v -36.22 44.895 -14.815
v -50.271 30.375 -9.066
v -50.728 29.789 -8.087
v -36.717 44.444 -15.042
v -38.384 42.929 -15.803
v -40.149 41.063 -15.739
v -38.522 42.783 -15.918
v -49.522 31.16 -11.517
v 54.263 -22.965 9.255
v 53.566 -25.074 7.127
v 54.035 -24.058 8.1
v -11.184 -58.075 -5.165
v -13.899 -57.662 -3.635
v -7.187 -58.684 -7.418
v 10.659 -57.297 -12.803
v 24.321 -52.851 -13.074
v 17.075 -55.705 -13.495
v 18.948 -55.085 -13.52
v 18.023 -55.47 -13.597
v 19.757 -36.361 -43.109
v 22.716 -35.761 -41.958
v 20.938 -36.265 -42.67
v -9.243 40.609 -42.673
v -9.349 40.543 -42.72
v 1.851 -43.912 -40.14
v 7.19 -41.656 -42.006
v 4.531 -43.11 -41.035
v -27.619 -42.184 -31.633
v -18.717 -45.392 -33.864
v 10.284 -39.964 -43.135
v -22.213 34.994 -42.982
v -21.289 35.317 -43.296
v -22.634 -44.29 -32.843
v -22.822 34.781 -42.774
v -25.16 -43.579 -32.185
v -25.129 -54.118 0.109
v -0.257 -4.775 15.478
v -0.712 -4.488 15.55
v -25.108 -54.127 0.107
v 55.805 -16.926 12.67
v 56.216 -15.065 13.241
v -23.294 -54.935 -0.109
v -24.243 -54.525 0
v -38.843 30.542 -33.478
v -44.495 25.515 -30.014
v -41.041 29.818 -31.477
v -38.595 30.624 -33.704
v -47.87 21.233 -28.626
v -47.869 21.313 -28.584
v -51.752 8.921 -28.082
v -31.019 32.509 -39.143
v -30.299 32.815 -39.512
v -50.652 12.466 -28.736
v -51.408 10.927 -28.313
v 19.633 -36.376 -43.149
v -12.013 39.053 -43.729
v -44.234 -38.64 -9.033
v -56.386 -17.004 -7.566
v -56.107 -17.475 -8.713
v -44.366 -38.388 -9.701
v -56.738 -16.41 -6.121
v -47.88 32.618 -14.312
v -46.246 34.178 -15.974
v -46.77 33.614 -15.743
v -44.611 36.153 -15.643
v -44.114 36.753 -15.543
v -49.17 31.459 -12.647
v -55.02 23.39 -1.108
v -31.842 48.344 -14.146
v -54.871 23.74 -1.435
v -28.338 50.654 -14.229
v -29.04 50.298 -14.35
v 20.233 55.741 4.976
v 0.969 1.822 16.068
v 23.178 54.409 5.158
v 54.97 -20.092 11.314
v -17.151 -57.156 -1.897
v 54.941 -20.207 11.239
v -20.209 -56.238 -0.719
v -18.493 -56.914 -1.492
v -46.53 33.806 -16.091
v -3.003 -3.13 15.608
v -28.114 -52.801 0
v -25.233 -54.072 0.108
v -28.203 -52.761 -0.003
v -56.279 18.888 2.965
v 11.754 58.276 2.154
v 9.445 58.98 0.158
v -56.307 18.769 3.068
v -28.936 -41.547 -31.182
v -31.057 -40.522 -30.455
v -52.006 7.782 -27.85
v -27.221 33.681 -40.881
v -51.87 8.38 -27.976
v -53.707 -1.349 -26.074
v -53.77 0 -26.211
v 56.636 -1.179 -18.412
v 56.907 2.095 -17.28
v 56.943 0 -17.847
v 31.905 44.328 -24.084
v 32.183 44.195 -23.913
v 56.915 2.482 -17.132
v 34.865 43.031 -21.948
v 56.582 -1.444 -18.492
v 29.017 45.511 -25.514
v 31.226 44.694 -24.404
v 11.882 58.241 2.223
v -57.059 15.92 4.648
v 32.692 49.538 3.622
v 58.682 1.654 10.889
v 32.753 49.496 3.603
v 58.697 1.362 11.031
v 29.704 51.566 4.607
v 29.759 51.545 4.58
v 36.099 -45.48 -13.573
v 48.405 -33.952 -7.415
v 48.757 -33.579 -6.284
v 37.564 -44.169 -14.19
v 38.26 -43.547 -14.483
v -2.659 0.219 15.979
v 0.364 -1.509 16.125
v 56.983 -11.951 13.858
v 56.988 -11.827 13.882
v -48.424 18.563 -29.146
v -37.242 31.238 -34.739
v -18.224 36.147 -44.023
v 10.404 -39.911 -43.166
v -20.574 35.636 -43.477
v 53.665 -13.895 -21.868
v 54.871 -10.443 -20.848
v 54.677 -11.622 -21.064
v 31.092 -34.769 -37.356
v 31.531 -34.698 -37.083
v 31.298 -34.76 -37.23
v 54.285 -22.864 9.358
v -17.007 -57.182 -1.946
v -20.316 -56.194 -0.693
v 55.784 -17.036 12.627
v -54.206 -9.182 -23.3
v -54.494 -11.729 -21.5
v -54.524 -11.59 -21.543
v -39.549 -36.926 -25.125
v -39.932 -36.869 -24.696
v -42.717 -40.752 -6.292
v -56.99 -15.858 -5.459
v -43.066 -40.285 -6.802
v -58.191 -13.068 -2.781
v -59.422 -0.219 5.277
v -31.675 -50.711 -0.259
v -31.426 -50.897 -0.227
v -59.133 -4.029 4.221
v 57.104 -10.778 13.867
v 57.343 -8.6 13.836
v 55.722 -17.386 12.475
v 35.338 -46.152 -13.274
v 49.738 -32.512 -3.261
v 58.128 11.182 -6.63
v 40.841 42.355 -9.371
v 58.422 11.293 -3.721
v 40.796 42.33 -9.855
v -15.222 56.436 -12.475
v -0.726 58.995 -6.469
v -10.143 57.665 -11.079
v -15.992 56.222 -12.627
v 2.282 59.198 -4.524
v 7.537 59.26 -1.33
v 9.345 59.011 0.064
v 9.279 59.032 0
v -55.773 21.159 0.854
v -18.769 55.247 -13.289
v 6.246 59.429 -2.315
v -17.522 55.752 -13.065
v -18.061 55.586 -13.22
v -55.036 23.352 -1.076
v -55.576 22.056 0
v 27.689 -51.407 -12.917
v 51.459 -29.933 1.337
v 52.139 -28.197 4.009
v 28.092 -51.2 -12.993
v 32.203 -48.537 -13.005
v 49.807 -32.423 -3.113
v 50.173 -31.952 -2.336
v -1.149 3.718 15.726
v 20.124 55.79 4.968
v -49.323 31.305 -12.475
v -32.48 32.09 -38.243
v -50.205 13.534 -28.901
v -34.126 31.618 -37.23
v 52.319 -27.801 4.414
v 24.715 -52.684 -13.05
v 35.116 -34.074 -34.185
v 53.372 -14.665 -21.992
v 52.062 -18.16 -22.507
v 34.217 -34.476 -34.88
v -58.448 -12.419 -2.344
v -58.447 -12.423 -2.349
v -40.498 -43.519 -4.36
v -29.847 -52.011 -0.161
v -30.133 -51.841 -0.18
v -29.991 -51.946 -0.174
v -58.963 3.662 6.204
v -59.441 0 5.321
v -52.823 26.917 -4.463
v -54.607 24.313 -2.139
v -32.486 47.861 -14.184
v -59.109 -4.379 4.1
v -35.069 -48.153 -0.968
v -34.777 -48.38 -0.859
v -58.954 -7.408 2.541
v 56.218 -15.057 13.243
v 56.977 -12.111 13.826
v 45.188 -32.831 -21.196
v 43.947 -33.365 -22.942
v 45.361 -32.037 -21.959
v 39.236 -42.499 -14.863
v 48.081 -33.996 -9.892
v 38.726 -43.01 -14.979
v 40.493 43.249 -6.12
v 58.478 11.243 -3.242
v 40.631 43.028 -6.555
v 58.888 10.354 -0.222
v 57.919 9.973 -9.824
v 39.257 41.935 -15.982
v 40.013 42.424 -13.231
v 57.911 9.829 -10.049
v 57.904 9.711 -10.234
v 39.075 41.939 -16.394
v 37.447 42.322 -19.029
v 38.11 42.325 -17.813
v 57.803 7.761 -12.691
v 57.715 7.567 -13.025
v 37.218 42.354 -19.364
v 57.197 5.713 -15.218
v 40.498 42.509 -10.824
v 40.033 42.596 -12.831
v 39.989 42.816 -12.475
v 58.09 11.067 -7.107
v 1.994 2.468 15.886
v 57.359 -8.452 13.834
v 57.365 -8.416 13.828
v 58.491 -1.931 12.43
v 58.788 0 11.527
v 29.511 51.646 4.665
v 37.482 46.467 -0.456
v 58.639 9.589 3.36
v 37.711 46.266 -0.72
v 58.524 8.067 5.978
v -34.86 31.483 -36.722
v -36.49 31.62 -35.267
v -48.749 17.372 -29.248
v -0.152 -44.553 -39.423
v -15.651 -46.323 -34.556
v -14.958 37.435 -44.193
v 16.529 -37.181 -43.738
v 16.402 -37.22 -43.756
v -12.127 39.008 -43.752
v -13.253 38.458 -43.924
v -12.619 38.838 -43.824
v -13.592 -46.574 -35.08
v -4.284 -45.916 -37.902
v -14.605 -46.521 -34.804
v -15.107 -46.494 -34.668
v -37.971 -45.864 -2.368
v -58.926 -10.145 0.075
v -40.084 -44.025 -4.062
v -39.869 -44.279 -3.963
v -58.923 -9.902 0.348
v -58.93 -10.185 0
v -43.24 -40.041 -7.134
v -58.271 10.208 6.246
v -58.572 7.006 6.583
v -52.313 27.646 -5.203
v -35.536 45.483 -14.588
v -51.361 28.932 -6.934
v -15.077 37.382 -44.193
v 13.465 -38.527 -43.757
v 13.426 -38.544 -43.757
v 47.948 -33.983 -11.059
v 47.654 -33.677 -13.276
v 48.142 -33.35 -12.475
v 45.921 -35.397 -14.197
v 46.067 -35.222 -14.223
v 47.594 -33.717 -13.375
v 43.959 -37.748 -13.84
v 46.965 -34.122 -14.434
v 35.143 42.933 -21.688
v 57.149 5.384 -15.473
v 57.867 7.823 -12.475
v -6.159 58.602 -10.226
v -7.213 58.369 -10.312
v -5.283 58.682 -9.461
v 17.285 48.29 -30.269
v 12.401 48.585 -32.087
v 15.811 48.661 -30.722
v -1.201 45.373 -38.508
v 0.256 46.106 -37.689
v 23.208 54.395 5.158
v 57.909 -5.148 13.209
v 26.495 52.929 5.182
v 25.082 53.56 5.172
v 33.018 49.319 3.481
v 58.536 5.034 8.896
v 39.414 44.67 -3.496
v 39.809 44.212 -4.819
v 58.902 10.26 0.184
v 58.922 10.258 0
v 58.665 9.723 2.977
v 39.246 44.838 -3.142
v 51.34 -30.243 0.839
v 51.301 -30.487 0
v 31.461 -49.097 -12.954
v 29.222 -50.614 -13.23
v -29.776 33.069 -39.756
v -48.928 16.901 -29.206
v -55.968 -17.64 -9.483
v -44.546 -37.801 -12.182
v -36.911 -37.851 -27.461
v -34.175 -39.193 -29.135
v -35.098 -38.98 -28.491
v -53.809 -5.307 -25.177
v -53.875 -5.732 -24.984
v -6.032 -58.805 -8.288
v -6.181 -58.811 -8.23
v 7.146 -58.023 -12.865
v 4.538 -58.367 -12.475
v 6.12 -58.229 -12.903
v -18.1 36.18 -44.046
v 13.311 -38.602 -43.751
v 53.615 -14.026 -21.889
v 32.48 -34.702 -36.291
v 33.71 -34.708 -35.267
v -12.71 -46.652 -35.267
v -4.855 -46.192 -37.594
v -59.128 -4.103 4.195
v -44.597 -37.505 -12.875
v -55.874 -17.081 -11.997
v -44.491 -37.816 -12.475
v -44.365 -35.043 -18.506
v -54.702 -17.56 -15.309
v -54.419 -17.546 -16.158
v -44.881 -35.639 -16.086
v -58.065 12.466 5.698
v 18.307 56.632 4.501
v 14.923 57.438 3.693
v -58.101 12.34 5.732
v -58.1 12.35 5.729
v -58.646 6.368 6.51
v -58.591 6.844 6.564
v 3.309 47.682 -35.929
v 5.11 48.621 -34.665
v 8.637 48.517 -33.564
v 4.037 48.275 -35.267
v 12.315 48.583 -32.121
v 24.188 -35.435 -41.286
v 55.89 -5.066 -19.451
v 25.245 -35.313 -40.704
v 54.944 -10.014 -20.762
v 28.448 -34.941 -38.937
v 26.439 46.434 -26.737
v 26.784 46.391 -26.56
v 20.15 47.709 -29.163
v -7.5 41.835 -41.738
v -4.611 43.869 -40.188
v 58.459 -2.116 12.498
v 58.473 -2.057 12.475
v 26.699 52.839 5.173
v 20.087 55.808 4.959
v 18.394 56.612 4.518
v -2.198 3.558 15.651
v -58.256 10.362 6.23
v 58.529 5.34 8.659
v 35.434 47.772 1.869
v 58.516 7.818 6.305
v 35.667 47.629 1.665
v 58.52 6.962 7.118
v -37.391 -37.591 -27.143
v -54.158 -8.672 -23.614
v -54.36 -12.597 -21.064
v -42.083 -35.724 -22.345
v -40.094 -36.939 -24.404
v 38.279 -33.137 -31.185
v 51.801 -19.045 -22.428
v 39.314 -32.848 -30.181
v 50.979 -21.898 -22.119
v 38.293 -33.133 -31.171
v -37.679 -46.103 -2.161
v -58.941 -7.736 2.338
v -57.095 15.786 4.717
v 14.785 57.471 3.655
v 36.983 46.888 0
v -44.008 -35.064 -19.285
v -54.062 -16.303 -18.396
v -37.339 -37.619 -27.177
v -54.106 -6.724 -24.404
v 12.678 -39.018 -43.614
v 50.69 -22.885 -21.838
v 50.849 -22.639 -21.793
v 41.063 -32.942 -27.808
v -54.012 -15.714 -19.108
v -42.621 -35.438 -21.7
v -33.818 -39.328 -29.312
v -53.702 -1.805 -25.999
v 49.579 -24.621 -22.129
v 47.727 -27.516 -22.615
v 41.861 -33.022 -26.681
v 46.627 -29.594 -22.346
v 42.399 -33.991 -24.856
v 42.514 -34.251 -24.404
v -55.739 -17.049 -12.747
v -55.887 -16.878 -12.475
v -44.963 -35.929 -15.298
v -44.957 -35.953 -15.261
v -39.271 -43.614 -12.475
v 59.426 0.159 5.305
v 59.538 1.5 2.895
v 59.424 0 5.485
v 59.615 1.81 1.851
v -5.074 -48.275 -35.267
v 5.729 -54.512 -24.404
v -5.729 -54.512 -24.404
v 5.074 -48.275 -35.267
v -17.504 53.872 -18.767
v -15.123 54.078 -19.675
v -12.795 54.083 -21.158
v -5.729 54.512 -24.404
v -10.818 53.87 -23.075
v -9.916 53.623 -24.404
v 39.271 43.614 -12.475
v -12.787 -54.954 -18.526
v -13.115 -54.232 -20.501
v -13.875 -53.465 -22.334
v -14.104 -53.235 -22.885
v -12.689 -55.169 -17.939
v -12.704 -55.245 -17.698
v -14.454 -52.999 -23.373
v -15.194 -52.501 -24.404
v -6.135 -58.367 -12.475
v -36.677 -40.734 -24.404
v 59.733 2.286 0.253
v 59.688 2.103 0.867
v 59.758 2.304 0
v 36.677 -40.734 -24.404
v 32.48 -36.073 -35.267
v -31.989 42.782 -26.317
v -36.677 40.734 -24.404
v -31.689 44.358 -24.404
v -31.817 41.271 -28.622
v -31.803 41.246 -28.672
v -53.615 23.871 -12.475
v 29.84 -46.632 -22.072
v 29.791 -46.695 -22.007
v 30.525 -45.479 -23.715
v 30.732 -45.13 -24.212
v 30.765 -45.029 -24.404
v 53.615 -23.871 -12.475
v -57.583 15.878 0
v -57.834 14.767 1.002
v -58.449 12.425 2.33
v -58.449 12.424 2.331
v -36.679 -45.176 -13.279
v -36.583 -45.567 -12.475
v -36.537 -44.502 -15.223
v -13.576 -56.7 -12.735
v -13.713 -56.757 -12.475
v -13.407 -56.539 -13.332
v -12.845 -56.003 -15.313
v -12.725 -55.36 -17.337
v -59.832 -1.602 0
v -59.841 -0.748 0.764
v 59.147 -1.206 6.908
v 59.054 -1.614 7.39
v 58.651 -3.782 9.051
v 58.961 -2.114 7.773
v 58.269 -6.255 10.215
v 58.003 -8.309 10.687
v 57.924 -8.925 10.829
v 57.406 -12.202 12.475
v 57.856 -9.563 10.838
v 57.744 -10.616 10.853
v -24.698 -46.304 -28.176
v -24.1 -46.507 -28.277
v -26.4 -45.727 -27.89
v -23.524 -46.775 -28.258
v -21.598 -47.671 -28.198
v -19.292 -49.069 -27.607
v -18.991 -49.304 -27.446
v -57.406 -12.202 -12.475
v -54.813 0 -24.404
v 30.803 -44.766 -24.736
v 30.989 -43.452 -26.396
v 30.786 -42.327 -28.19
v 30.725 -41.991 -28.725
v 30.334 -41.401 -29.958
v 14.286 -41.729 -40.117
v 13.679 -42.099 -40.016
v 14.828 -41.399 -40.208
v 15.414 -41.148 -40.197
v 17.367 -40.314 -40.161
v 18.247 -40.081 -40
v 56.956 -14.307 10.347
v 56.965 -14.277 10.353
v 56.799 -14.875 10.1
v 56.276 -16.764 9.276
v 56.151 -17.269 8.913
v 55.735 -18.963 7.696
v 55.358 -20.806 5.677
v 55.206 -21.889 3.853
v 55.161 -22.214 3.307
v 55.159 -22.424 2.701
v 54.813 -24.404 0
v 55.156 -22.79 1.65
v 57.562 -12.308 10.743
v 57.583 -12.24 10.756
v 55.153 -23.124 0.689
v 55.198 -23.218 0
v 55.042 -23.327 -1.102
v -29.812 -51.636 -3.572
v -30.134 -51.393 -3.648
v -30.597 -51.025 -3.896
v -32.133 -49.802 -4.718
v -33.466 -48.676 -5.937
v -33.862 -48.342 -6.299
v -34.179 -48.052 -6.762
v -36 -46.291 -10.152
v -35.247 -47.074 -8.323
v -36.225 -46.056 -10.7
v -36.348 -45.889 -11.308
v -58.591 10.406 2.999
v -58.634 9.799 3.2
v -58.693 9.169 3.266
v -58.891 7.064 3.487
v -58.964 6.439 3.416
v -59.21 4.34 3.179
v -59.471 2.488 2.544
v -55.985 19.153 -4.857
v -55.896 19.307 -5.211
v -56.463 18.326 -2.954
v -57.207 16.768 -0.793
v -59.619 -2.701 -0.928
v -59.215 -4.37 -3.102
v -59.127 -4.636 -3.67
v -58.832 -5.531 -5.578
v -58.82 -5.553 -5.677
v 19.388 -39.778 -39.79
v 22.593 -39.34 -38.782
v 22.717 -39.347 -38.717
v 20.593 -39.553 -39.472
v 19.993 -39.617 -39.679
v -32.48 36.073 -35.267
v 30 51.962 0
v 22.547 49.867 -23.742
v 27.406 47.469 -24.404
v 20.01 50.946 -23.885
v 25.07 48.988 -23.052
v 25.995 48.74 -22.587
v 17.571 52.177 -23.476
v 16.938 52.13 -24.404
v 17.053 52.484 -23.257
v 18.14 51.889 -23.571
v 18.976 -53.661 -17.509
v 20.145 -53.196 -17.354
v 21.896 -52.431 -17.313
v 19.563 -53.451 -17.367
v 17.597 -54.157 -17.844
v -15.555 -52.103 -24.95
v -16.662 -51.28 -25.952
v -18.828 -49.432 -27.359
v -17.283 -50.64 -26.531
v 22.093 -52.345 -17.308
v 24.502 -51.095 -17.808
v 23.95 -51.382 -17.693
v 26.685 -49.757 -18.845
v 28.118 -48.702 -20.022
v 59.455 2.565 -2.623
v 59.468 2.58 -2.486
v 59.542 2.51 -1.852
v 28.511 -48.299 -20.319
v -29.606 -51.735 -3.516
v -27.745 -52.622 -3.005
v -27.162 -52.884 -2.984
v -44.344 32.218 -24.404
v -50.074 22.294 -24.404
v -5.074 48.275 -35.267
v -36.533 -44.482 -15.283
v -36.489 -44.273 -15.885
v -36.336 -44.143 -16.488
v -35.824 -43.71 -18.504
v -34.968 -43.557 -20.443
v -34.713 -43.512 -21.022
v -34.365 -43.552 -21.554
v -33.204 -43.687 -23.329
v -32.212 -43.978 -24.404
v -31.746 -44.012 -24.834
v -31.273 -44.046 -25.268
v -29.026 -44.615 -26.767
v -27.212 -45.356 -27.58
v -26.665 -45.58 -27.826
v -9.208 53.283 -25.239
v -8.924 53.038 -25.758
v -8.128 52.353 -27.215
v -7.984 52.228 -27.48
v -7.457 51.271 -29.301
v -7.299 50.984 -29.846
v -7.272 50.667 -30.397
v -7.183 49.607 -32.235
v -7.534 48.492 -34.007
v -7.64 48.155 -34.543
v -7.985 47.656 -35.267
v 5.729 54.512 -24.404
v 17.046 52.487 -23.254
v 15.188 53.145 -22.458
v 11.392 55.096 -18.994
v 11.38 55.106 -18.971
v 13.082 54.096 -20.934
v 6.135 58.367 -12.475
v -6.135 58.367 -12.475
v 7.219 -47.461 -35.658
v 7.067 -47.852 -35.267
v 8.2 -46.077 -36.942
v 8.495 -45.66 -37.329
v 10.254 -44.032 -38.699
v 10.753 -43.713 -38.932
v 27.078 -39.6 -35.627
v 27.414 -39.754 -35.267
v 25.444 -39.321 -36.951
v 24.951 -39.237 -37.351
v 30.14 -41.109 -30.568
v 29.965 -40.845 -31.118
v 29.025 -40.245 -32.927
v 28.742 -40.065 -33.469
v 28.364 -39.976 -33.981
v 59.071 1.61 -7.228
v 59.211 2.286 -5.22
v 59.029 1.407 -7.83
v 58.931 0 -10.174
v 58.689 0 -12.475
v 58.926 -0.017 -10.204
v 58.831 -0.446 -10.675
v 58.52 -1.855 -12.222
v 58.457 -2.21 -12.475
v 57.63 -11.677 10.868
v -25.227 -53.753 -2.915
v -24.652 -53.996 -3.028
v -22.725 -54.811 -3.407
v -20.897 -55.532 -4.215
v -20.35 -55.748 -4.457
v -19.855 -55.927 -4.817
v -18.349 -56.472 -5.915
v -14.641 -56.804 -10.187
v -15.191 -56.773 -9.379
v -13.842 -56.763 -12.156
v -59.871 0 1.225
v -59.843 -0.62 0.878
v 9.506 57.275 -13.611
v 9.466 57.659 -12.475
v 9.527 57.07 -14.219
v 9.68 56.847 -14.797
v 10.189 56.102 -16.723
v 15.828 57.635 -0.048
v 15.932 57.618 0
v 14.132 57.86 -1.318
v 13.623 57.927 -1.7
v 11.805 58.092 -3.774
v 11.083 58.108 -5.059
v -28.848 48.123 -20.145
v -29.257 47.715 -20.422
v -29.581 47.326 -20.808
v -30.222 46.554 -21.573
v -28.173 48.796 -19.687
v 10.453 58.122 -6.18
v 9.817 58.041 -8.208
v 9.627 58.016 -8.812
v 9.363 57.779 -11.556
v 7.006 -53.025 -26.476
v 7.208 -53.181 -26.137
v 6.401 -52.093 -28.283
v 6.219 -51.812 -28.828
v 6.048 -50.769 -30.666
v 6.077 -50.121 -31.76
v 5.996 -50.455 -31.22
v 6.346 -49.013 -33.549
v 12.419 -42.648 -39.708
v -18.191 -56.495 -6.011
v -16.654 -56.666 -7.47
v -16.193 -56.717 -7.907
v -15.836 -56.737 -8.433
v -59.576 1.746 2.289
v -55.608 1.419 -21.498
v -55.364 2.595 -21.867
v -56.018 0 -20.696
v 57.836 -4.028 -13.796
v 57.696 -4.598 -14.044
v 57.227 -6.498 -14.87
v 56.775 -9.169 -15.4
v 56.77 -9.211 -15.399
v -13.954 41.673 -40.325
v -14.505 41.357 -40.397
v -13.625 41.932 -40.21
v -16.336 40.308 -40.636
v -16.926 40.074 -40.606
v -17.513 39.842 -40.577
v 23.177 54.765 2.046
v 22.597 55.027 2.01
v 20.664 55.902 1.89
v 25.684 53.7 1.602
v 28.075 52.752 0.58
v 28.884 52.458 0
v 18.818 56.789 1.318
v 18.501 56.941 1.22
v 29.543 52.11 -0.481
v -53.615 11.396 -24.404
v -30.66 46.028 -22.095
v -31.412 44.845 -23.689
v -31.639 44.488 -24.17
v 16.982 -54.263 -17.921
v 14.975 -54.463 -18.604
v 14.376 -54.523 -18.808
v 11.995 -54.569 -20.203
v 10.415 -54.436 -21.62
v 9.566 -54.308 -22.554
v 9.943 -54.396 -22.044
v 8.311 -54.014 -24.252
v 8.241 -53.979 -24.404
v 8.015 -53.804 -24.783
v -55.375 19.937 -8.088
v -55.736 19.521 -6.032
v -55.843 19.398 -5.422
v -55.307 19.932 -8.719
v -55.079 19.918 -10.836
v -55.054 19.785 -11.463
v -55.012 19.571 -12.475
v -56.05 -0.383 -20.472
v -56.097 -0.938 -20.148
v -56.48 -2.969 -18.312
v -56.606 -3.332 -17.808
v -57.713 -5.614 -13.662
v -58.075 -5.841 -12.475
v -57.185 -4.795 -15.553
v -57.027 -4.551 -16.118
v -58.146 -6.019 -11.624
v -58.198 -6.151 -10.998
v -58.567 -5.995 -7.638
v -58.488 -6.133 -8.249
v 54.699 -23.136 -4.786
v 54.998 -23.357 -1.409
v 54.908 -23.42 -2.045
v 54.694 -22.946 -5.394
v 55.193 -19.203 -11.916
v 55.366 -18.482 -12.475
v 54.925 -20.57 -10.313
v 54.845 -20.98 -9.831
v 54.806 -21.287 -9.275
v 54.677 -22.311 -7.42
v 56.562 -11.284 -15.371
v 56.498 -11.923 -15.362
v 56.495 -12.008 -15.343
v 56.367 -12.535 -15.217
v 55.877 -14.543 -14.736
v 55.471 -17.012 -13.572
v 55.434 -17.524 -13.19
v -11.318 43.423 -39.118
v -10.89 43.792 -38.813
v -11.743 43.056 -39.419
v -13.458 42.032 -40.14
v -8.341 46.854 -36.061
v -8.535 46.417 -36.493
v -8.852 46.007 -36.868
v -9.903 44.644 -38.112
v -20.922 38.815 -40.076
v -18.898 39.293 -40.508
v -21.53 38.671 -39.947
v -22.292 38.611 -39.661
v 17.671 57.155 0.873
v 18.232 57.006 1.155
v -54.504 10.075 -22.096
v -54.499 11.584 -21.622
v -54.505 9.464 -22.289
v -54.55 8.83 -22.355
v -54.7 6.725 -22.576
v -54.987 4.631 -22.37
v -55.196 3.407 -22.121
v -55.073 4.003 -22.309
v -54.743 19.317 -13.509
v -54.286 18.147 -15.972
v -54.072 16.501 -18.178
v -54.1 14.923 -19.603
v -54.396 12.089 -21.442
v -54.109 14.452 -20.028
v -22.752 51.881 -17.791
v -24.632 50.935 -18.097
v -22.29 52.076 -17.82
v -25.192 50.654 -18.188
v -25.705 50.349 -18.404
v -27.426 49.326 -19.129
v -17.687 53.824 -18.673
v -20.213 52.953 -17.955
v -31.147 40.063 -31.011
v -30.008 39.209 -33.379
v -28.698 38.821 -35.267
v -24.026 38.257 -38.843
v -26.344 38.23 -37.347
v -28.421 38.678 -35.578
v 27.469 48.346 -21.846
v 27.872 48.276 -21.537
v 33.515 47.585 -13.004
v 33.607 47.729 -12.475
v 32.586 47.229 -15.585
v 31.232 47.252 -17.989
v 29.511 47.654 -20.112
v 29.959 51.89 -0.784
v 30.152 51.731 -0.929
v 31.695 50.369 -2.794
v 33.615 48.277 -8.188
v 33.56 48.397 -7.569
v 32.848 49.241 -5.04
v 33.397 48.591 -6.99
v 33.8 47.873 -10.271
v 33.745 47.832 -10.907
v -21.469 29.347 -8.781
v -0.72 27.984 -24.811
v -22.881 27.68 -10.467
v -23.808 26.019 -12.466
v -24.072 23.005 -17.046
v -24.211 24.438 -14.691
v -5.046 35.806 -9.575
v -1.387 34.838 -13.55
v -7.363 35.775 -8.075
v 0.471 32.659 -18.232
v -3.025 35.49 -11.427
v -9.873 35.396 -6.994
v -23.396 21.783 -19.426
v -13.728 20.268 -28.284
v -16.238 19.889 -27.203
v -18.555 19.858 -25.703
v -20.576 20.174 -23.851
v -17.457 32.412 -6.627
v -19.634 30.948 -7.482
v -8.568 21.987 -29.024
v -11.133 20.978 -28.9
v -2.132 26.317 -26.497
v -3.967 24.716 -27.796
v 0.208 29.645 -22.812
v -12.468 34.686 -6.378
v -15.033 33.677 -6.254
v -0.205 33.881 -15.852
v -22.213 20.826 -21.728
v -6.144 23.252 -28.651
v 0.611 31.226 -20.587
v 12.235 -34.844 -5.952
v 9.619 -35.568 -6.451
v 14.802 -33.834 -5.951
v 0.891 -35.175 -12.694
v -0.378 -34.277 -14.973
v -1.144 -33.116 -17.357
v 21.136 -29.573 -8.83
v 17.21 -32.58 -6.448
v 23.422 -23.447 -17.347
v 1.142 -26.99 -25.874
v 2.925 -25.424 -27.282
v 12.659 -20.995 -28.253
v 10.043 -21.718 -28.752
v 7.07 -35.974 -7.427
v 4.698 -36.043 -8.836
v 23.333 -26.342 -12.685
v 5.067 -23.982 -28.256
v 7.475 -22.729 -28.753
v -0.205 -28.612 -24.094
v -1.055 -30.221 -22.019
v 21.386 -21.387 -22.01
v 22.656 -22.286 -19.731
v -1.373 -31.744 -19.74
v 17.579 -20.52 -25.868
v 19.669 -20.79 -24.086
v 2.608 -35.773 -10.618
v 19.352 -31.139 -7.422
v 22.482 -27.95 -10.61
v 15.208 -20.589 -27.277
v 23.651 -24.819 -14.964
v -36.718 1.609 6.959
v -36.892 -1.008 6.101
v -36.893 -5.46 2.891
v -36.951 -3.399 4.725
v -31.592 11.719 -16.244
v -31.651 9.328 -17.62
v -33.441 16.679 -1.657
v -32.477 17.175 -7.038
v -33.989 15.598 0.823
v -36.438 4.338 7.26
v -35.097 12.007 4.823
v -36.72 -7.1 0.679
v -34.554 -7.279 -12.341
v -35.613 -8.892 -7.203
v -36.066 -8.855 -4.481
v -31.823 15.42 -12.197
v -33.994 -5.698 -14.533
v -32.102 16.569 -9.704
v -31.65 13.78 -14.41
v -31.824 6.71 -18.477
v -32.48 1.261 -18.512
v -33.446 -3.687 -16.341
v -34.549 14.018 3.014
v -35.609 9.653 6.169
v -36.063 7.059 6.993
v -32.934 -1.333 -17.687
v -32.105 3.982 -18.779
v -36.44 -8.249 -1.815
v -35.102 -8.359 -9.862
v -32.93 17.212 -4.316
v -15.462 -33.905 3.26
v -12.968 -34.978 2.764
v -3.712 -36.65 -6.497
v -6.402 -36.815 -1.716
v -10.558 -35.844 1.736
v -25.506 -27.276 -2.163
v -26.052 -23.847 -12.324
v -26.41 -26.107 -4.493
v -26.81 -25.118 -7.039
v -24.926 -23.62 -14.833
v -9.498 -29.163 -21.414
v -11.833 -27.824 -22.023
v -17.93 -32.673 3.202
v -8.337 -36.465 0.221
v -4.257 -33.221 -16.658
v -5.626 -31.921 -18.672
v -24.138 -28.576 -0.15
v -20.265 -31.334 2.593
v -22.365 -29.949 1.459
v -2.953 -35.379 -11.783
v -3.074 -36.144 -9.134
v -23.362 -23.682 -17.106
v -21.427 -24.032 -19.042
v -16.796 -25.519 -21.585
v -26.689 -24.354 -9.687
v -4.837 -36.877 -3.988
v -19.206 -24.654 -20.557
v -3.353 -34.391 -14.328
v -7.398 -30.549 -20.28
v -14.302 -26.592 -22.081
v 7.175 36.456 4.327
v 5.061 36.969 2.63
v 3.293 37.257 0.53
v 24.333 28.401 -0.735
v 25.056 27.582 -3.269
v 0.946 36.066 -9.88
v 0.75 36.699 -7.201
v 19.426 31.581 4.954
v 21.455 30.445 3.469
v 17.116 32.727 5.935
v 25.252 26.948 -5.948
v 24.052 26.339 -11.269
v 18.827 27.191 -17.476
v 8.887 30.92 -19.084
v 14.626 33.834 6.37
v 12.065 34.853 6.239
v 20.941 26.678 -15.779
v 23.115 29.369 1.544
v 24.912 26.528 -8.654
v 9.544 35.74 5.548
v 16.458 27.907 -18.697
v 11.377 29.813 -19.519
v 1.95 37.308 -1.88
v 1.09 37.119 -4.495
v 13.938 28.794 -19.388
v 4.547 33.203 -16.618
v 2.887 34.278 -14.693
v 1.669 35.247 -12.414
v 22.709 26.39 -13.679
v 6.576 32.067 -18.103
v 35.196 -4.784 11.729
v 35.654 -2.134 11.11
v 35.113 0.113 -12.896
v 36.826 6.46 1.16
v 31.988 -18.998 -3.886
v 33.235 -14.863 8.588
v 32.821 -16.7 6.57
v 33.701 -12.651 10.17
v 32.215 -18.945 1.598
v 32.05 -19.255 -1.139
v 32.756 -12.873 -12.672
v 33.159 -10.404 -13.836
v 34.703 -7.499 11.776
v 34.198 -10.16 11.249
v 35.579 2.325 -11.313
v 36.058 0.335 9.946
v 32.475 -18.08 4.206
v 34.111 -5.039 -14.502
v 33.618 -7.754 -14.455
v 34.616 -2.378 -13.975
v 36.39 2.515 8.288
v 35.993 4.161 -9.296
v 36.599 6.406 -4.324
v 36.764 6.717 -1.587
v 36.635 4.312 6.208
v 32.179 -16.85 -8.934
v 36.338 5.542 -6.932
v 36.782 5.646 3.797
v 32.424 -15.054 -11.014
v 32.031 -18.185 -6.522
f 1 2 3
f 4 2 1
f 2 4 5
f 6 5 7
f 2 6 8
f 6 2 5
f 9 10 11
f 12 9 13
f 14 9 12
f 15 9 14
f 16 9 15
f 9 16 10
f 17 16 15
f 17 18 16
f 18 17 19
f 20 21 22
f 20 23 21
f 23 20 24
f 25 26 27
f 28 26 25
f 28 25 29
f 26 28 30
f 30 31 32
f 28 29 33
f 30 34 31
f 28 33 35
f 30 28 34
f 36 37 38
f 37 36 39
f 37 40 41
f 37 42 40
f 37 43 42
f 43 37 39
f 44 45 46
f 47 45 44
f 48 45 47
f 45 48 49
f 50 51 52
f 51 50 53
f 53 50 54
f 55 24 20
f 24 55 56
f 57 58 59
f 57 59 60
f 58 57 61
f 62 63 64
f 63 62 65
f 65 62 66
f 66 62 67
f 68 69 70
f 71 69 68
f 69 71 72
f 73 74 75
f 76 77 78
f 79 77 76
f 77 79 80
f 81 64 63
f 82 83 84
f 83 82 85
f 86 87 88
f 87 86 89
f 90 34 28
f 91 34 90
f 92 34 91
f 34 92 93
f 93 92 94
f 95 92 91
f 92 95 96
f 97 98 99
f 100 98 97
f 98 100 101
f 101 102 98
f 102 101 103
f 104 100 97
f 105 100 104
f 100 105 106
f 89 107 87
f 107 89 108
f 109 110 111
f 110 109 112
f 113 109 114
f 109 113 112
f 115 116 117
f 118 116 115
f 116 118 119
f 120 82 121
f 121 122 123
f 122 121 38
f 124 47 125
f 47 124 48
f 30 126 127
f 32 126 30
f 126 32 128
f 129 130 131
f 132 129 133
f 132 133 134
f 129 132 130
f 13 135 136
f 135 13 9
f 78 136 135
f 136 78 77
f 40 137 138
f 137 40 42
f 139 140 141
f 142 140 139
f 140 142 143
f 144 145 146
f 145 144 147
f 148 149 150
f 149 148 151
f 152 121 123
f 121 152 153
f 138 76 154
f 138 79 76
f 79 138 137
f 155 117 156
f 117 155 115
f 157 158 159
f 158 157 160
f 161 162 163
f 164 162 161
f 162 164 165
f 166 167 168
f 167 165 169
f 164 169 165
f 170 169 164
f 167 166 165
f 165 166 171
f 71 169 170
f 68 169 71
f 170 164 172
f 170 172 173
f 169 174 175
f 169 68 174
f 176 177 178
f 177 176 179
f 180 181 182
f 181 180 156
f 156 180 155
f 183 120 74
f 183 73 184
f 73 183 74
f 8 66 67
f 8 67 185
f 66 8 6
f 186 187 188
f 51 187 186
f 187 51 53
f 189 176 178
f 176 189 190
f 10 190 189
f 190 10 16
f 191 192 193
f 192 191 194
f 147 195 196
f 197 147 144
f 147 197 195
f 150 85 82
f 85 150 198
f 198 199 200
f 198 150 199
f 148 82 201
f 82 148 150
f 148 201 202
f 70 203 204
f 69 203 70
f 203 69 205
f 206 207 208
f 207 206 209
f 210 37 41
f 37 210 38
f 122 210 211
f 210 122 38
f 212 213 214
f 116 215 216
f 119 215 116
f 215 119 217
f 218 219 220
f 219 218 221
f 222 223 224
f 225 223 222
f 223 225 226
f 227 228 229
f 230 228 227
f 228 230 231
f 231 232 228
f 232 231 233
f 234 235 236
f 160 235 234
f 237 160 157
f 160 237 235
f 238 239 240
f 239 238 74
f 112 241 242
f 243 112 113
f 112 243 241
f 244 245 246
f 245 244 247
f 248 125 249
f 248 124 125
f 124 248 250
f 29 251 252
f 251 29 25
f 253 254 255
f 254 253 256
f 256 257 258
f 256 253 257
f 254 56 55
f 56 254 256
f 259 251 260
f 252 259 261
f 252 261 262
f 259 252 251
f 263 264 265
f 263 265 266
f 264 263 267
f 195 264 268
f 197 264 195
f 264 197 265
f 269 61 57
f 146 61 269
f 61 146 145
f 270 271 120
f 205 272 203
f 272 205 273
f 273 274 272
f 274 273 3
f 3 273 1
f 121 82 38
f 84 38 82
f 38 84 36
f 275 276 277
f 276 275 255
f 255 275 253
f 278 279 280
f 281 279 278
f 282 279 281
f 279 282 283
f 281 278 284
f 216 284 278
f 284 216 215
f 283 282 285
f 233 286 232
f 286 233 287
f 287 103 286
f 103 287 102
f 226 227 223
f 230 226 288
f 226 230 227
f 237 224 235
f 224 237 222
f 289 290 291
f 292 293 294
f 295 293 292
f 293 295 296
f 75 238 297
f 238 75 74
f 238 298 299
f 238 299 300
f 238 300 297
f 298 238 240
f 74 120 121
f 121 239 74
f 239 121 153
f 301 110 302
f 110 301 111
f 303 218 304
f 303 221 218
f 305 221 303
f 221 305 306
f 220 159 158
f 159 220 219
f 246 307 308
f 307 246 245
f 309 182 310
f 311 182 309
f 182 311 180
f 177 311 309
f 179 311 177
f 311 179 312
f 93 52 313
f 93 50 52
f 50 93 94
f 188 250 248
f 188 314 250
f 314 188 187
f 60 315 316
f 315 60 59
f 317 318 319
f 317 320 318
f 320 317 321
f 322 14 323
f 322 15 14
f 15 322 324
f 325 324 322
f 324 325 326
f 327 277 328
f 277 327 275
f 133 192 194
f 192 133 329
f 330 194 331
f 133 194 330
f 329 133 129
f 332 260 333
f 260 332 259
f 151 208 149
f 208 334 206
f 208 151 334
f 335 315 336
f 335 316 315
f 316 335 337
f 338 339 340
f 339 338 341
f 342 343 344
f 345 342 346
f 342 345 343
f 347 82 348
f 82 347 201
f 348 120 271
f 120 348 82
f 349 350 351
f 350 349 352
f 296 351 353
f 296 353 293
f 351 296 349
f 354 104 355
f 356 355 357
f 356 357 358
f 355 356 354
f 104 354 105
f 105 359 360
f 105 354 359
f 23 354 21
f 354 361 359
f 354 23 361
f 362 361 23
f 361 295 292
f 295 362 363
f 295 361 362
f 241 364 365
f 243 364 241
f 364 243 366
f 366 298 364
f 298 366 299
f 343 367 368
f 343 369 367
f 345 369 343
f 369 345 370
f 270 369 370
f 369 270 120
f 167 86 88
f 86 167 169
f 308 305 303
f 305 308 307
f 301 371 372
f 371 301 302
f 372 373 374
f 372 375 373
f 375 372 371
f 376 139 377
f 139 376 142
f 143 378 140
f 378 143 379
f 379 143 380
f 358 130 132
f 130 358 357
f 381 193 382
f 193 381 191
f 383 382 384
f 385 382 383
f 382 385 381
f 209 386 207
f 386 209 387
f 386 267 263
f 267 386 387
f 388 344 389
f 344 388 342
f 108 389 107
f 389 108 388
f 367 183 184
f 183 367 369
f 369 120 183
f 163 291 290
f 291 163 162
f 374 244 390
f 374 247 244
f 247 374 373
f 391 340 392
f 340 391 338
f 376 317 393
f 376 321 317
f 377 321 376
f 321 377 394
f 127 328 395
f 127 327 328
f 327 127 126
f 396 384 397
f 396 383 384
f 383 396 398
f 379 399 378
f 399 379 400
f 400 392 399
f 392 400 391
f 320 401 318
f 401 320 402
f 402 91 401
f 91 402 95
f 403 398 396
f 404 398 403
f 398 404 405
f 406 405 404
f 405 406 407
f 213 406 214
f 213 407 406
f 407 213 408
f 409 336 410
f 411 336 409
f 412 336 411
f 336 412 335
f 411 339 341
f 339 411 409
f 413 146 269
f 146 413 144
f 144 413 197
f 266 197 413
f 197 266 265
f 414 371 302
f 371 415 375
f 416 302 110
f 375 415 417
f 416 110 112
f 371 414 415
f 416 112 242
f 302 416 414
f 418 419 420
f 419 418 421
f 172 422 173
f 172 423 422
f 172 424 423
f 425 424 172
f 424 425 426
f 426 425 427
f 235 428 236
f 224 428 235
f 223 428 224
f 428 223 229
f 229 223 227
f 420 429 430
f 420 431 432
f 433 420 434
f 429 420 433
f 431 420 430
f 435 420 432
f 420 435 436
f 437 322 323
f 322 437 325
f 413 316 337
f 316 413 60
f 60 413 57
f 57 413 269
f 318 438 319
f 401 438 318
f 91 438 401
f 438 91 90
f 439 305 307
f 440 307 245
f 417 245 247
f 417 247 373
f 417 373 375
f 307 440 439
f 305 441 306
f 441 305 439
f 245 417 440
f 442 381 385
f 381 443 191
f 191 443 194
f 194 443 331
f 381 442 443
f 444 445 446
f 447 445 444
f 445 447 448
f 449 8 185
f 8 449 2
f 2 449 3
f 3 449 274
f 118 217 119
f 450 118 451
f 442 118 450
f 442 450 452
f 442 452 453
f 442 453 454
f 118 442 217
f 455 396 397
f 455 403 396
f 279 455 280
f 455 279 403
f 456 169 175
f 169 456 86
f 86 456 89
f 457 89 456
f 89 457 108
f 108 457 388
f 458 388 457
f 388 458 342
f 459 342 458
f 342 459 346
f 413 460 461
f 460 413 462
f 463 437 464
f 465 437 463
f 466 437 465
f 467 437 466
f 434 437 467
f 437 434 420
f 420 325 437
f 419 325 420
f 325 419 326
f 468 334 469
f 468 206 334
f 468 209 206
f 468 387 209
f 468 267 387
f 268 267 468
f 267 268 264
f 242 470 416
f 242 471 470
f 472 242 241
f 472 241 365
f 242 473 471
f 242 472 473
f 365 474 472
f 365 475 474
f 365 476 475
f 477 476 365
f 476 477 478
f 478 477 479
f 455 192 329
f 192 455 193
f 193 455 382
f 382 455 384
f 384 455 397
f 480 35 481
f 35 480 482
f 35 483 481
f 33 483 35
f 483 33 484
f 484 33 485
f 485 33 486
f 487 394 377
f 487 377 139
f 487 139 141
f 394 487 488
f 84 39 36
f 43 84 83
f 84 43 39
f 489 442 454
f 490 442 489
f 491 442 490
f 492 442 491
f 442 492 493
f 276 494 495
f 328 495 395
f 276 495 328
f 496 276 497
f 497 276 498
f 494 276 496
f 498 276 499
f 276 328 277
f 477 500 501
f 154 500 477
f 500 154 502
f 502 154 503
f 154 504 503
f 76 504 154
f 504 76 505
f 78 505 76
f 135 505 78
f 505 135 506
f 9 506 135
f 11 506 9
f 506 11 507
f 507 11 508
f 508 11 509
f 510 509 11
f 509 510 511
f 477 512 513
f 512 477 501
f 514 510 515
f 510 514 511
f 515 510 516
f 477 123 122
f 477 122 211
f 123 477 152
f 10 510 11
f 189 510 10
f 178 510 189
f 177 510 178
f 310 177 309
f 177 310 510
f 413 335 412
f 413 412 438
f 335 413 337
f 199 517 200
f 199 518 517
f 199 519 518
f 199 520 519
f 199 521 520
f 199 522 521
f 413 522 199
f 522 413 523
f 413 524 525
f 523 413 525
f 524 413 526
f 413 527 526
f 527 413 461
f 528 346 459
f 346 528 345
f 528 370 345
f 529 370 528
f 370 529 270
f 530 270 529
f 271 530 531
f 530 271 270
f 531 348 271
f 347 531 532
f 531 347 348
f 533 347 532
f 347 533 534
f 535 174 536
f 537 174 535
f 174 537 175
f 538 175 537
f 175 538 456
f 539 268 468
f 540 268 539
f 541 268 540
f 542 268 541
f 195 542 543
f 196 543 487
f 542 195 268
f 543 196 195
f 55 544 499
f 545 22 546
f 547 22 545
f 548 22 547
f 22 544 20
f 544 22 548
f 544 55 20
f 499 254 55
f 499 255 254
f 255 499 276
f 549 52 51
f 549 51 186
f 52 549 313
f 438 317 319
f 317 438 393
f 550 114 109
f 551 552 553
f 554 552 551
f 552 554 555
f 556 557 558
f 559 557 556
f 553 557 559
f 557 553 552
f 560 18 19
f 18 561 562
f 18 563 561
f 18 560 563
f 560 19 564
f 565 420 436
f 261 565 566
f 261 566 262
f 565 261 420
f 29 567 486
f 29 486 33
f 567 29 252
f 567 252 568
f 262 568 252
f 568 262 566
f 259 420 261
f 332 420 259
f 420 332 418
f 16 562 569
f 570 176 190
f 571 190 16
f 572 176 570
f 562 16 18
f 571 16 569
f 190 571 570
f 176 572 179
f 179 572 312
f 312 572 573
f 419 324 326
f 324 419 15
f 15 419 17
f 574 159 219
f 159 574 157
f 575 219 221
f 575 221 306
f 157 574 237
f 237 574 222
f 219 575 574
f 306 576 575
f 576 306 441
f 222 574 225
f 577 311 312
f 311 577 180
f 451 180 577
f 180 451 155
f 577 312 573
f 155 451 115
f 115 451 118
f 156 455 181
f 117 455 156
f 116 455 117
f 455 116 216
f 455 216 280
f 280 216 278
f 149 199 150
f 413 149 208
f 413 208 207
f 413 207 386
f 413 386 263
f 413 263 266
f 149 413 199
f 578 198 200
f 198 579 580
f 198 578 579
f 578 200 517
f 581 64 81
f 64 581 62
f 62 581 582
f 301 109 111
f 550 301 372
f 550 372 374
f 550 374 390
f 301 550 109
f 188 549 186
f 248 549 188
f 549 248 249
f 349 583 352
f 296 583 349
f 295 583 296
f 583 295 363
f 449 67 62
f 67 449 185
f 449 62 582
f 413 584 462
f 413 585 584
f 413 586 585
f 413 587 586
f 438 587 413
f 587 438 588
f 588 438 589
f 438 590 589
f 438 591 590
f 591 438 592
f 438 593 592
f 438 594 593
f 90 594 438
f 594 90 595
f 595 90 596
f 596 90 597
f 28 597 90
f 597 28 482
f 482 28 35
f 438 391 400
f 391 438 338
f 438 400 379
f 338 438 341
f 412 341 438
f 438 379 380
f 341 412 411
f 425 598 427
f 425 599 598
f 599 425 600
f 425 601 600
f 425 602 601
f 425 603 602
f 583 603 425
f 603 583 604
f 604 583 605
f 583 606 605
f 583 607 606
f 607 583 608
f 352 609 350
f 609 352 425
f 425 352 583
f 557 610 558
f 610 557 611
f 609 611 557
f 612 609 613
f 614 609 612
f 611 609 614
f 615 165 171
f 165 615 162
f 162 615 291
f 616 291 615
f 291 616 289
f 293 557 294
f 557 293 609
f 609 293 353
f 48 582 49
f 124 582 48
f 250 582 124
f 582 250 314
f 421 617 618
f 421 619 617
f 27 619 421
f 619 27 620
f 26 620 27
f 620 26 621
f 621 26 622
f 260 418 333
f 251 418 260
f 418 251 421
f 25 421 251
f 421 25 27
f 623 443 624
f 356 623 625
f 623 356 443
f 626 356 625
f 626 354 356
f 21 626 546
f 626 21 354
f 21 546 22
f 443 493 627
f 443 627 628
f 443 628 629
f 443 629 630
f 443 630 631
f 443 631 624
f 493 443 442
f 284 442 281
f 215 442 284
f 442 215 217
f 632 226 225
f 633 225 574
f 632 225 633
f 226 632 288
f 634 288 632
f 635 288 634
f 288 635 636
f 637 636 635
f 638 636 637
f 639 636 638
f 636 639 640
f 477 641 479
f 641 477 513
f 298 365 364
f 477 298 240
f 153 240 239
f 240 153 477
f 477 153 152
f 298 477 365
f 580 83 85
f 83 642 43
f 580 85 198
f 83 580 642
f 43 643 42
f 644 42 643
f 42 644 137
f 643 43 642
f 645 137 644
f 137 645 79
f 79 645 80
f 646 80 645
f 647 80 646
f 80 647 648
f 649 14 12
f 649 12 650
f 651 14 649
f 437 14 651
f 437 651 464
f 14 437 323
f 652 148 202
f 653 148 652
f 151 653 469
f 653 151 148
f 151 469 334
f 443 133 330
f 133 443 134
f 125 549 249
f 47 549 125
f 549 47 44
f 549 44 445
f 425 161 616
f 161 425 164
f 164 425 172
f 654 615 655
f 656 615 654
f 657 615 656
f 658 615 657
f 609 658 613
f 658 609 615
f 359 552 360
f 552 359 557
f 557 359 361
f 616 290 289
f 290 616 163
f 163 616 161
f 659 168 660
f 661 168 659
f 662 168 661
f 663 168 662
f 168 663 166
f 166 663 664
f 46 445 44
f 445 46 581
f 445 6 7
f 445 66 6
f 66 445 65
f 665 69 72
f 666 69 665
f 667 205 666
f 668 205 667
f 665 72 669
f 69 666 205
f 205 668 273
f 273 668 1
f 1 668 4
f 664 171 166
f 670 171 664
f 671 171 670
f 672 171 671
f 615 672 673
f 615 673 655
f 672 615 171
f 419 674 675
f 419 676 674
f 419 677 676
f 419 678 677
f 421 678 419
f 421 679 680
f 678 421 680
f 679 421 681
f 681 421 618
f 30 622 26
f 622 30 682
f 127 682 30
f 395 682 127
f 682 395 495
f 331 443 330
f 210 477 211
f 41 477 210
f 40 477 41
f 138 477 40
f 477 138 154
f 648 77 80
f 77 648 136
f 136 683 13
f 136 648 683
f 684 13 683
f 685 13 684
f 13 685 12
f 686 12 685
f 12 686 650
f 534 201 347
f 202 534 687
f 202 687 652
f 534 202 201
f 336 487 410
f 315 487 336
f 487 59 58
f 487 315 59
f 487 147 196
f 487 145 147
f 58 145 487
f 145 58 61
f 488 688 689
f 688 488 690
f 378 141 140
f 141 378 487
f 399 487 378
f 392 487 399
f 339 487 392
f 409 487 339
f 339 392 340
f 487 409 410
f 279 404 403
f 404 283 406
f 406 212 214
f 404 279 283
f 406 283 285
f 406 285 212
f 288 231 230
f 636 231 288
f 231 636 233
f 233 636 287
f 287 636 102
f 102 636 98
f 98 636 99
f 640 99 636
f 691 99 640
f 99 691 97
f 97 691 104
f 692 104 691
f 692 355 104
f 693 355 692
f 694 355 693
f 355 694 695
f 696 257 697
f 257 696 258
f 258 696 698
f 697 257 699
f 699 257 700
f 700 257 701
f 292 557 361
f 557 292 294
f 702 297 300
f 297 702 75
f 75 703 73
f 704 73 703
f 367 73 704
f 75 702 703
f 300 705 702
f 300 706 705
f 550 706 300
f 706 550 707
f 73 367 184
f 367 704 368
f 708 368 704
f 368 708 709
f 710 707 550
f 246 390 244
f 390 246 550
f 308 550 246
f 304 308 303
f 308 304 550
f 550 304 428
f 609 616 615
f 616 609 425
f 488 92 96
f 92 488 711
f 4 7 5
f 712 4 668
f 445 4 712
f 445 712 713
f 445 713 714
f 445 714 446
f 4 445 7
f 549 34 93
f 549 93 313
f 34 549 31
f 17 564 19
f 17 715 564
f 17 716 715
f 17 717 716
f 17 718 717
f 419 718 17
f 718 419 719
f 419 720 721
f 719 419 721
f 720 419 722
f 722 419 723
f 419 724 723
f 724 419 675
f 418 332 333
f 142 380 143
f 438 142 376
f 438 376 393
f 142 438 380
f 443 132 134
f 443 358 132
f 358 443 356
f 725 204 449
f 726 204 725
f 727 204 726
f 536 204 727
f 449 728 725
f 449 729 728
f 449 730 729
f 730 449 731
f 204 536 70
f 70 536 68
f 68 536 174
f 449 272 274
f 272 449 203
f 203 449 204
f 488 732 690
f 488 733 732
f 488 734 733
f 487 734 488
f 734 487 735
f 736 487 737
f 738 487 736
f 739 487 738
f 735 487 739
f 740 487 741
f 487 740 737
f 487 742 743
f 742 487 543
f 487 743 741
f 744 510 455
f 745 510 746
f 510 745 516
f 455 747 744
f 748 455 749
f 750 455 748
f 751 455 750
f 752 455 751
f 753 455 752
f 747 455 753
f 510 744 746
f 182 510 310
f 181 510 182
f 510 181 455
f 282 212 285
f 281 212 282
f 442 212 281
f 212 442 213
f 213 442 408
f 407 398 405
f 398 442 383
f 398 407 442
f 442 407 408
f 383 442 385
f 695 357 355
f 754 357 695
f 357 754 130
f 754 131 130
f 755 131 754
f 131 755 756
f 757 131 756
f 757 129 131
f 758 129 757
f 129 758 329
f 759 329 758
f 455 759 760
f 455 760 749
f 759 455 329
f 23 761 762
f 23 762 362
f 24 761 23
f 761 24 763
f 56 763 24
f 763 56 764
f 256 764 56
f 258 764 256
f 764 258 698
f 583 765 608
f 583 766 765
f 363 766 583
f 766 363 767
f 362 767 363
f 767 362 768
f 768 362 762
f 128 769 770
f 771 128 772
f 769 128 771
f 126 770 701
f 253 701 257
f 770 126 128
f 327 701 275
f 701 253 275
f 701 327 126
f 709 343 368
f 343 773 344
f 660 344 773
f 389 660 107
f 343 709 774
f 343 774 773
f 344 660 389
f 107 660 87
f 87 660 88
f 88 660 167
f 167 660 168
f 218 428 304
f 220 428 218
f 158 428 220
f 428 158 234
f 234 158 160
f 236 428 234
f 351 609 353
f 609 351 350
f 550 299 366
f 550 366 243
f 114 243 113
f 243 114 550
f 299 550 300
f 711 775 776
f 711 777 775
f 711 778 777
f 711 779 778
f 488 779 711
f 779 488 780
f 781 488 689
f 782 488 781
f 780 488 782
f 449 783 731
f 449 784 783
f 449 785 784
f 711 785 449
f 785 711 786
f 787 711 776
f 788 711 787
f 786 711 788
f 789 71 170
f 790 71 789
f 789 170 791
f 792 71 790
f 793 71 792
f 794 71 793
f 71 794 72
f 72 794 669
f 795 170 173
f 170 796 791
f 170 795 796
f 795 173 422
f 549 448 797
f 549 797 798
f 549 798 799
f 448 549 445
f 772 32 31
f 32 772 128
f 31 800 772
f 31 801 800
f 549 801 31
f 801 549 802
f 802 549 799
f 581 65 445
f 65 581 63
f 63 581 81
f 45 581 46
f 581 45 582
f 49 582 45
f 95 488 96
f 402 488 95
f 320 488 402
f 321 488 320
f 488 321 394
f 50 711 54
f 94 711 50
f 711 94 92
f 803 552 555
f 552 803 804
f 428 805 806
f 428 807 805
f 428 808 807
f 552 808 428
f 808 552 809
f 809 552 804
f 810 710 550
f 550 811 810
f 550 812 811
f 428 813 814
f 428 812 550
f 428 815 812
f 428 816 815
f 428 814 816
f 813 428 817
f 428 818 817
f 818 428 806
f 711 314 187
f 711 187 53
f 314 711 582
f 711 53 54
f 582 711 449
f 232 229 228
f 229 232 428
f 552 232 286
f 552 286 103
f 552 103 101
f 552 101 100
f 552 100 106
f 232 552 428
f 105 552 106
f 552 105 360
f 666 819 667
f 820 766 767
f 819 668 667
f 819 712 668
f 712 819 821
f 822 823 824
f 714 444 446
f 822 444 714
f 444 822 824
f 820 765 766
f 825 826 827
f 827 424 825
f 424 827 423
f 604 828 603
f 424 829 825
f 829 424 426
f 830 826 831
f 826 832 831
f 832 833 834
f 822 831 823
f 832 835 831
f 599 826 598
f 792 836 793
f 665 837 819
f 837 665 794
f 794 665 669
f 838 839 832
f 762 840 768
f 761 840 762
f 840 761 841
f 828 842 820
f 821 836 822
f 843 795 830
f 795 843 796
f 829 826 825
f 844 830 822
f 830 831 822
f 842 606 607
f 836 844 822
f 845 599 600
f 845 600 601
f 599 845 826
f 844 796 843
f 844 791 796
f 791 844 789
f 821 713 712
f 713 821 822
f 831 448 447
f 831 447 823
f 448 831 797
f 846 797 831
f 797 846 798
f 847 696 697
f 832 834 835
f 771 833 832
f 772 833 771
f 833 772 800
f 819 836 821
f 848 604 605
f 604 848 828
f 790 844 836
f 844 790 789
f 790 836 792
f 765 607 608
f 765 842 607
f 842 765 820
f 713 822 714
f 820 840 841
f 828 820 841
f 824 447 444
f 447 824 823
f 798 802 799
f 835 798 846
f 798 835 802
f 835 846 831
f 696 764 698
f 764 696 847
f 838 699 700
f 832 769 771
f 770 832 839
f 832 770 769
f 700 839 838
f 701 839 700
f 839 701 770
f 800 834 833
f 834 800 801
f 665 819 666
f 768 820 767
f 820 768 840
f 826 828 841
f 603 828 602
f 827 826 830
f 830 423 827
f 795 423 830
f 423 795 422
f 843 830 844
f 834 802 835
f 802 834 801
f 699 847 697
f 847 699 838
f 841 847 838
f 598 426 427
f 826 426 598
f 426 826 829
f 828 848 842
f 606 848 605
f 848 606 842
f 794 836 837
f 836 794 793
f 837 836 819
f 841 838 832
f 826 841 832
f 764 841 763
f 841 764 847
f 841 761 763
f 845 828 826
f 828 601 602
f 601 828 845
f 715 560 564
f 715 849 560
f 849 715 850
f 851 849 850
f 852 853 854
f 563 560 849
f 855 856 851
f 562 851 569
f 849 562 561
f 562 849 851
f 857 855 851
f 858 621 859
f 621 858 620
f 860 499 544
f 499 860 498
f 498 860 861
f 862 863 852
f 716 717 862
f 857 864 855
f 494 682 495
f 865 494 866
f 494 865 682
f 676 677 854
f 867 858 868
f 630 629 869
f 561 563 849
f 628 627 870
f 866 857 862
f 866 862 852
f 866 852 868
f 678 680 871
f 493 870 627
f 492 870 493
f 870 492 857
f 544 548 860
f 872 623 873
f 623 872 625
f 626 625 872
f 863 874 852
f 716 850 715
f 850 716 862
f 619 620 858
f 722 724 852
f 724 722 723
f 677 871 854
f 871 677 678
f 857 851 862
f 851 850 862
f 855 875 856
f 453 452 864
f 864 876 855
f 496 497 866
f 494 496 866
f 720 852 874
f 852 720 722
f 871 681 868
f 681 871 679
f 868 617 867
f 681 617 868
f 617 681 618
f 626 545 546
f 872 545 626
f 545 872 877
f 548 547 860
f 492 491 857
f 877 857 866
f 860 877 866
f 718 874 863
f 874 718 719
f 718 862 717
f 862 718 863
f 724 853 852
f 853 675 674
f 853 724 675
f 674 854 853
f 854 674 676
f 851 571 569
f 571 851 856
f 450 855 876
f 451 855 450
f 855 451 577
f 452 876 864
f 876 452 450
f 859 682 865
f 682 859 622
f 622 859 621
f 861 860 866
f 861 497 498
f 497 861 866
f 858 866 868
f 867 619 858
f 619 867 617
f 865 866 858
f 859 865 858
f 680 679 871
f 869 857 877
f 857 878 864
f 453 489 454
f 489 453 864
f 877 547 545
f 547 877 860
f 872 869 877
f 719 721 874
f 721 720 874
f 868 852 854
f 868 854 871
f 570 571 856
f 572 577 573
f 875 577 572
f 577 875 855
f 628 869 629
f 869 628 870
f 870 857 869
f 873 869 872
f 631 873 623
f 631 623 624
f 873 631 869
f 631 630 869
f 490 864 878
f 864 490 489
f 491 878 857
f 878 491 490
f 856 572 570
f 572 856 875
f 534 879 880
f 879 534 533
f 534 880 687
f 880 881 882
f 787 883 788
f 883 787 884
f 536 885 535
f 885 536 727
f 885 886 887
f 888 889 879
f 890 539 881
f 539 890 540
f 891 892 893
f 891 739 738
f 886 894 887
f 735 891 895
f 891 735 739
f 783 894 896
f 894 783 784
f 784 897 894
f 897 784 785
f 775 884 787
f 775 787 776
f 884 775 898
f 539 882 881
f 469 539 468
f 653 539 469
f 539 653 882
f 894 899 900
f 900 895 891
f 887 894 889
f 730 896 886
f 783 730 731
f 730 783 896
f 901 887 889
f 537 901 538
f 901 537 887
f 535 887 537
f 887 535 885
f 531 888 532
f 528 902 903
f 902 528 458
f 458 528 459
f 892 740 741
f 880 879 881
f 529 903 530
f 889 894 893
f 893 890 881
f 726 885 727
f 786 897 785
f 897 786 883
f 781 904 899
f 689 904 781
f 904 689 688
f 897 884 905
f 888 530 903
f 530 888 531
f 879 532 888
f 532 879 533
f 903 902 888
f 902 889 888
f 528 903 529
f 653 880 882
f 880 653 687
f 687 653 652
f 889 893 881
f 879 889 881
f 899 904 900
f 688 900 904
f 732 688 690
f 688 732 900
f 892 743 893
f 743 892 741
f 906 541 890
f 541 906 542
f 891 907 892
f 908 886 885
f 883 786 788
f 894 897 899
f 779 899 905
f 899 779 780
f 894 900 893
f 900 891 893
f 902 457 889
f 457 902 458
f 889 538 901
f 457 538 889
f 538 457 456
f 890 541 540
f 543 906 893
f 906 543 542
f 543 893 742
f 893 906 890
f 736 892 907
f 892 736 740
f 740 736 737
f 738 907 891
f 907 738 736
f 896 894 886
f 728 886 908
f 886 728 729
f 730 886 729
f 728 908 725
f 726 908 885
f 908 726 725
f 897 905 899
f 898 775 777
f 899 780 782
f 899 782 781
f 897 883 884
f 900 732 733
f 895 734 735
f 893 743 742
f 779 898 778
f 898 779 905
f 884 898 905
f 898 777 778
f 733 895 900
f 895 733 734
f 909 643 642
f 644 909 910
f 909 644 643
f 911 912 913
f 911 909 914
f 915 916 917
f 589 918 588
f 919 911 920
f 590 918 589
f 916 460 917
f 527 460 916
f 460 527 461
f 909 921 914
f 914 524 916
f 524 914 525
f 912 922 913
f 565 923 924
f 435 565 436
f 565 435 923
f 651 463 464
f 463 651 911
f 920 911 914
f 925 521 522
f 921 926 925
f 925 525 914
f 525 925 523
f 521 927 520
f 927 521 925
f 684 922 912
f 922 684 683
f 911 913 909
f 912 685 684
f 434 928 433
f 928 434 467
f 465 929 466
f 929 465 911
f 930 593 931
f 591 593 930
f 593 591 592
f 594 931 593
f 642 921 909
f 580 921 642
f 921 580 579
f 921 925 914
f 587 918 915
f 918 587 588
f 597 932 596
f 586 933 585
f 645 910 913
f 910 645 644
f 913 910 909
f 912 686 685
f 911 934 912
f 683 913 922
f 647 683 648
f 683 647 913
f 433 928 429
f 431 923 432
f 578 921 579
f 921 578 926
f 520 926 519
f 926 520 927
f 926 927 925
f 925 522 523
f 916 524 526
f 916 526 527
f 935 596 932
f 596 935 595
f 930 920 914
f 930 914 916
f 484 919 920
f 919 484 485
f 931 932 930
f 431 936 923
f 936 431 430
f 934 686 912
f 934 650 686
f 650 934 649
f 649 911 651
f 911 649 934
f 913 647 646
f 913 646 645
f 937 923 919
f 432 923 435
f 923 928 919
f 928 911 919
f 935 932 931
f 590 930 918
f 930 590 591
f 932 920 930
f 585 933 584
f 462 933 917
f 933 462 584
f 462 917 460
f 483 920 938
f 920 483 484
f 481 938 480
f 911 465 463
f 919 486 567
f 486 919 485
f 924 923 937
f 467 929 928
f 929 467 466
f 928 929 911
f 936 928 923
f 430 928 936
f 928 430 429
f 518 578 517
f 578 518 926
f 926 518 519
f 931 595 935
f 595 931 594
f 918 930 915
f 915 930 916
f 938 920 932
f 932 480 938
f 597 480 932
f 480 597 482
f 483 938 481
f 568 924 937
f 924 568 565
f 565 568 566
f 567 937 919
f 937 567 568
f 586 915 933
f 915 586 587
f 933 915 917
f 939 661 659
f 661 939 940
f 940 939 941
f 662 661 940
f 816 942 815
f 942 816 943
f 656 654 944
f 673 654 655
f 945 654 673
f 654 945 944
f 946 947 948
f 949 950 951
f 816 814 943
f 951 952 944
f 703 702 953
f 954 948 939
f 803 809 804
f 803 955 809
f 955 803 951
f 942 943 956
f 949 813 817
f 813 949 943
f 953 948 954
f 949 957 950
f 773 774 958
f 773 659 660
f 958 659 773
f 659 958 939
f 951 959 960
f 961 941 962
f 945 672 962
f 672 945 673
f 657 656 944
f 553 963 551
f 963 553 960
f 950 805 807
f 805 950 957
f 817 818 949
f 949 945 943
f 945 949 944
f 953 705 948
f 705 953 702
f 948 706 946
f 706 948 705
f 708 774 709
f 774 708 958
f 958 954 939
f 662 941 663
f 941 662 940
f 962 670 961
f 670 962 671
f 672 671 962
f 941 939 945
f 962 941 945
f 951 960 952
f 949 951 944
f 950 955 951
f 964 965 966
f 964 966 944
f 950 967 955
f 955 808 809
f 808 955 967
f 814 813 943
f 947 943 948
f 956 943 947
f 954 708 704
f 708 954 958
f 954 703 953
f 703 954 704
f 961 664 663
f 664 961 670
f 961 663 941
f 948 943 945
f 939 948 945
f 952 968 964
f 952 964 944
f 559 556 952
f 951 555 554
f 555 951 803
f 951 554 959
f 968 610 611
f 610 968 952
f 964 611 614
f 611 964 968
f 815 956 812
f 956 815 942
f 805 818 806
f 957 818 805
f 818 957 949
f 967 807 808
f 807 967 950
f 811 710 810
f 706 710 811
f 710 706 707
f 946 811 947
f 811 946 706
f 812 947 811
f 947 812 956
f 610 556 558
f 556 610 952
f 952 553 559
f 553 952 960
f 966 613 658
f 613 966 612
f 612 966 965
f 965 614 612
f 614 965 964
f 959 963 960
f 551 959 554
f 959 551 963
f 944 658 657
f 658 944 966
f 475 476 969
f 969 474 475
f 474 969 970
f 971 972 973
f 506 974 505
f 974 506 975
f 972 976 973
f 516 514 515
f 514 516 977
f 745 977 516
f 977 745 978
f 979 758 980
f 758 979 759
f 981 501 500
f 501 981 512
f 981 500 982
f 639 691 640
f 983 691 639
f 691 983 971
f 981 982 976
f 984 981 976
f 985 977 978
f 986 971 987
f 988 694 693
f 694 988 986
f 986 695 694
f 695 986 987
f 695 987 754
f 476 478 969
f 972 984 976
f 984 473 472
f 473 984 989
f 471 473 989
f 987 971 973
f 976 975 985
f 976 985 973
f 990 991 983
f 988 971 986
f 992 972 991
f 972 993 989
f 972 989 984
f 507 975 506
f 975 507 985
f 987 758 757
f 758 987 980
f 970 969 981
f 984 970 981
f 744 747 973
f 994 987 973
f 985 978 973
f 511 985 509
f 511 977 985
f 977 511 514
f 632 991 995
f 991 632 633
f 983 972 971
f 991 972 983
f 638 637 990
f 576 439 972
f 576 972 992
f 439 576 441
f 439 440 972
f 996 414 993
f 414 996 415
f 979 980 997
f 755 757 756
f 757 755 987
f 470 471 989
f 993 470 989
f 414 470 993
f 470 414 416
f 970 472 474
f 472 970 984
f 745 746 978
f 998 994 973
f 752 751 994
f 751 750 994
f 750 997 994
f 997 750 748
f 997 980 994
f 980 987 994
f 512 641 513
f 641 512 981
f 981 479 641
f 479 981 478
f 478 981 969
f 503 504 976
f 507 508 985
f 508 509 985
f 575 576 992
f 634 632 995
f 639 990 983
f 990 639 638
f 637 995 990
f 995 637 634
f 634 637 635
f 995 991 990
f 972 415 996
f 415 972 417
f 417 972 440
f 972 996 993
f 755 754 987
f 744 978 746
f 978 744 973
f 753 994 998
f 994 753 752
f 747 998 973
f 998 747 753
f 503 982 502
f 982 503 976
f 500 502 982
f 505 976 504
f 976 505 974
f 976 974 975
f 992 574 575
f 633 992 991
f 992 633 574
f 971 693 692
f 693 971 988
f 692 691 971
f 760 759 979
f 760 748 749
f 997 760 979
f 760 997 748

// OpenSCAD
difference() {
	intersection() {
		hull() {
			rotate(a = -88.7188562033, v = [-0.3782103142, 0.9254496550, 0.0000000000]) {
				rotate(a = -90.0000000000, v = [0.6087614290, 0.7933533403, -0.0000000000]) {
					cylinder(h = 60, r = 16.2000000000);
				}
			}
			rotate(a = -88.7188562033, v = [-0.3782103142, 0.9254496550, 0.0000000000]) {
				rotate(a = -90.0000000000, v = [-0.9914448614, 0.1305261922, 0.0000000000]) {
					cylinder(h = 60, r = 16.2000000000);
				}
			}
			rotate(a = -88.7188562033, v = [-0.3782103142, 0.9254496550, 0.0000000000]) {
				rotate(a = -30.9572897354, v = [0.3752236381, 0.3518714557, -0.0000000000]) {
					cylinder(h = 60, r = 16.2000000000);
				}
			}
			rotate(a = -88.7188562033, v = [-0.3782103142, 0.9254496550, 0.0000000000]) {
				rotate(a = -44.4101790692, v = [-0.6994460914, 0.0219448216, 0.0000000000]) {
					cylinder(h = 60, r = 16.2000000000);
				}
			}
			rotate(a = -88.7188562033, v = [-0.3782103142, 0.9254496550, 0.0000000000]) {
				rotate(a = -133.7770785757, v = [0.5838132168, 0.4248525055, -0.0000000000]) {
					cylinder(h = 60, r = 16.2000000000);
				}
			}
			rotate(a = -88.7188562033, v = [-0.3782103142, 0.9254496550, 0.0000000000]) {
				rotate(a = -147.4470048335, v = [-0.5053465272, -0.1848090856, 0.0000000000]) {
					cylinder(h = 60, r = 16.2000000000);
				}
			}
		}
		sphere(r = 60);
	}
	union() {
		rotate(a = -88.7188562033, v = [-0.3782103142, 0.9254496550, 0.0000000000]) {
			rotate(a = -90.0000000000, v = [0.6087614290, 0.7933533403, -0.0000000000]) {
				translate(v = [0, 0, 35]) {
					cylinder(h = 100, r = 13.2000000000);
				}
			}
		}
		rotate(a = -88.7188562033, v = [-0.3782103142, 0.9254496550, 0.0000000000]) {
			rotate(a = -90.0000000000, v = [-0.9914448614, 0.1305261922, 0.0000000000]) {
				translate(v = [0, 0, 35]) {
					cylinder(h = 100, r = 13.2000000000);
				}
			}
		}
		rotate(a = -88.7188562033, v = [-0.3782103142, 0.9254496550, 0.0000000000]) {
			rotate(a = -30.9572897354, v = [0.3752236381, 0.3518714557, -0.0000000000]) {
				translate(v = [0, 0, 35]) {
					cylinder(h = 100, r = 13.2000000000);
				}
			}
		}
		rotate(a = -88.7188562033, v = [-0.3782103142, 0.9254496550, 0.0000000000]) {
			rotate(a = -44.4101790692, v = [-0.6994460914, 0.0219448216, 0.0000000000]) {
				translate(v = [0, 0, 35]) {
					cylinder(h = 100, r = 13.2000000000);
				}
			}
		}
		rotate(a = -88.7188562033, v = [-0.3782103142, 0.9254496550, 0.0000000000]) {
			rotate(a = -133.7770785757, v = [0.5838132168, 0.4248525055, -0.0000000000]) {
				translate(v = [0, 0, 35]) {
					cylinder(h = 100, r = 13.2000000000);
				}
			}
		}
		rotate(a = -88.7188562033, v = [-0.3782103142, 0.9254496550, 0.0000000000]) {
			rotate(a = -147.4470048335, v = [-0.5053465272, -0.1848090856, 0.0000000000]) {
				translate(v = [0, 0, 35]) {
					cylinder(h = 100, r = 13.2000000000);
				}
			}
		}
	}
}
